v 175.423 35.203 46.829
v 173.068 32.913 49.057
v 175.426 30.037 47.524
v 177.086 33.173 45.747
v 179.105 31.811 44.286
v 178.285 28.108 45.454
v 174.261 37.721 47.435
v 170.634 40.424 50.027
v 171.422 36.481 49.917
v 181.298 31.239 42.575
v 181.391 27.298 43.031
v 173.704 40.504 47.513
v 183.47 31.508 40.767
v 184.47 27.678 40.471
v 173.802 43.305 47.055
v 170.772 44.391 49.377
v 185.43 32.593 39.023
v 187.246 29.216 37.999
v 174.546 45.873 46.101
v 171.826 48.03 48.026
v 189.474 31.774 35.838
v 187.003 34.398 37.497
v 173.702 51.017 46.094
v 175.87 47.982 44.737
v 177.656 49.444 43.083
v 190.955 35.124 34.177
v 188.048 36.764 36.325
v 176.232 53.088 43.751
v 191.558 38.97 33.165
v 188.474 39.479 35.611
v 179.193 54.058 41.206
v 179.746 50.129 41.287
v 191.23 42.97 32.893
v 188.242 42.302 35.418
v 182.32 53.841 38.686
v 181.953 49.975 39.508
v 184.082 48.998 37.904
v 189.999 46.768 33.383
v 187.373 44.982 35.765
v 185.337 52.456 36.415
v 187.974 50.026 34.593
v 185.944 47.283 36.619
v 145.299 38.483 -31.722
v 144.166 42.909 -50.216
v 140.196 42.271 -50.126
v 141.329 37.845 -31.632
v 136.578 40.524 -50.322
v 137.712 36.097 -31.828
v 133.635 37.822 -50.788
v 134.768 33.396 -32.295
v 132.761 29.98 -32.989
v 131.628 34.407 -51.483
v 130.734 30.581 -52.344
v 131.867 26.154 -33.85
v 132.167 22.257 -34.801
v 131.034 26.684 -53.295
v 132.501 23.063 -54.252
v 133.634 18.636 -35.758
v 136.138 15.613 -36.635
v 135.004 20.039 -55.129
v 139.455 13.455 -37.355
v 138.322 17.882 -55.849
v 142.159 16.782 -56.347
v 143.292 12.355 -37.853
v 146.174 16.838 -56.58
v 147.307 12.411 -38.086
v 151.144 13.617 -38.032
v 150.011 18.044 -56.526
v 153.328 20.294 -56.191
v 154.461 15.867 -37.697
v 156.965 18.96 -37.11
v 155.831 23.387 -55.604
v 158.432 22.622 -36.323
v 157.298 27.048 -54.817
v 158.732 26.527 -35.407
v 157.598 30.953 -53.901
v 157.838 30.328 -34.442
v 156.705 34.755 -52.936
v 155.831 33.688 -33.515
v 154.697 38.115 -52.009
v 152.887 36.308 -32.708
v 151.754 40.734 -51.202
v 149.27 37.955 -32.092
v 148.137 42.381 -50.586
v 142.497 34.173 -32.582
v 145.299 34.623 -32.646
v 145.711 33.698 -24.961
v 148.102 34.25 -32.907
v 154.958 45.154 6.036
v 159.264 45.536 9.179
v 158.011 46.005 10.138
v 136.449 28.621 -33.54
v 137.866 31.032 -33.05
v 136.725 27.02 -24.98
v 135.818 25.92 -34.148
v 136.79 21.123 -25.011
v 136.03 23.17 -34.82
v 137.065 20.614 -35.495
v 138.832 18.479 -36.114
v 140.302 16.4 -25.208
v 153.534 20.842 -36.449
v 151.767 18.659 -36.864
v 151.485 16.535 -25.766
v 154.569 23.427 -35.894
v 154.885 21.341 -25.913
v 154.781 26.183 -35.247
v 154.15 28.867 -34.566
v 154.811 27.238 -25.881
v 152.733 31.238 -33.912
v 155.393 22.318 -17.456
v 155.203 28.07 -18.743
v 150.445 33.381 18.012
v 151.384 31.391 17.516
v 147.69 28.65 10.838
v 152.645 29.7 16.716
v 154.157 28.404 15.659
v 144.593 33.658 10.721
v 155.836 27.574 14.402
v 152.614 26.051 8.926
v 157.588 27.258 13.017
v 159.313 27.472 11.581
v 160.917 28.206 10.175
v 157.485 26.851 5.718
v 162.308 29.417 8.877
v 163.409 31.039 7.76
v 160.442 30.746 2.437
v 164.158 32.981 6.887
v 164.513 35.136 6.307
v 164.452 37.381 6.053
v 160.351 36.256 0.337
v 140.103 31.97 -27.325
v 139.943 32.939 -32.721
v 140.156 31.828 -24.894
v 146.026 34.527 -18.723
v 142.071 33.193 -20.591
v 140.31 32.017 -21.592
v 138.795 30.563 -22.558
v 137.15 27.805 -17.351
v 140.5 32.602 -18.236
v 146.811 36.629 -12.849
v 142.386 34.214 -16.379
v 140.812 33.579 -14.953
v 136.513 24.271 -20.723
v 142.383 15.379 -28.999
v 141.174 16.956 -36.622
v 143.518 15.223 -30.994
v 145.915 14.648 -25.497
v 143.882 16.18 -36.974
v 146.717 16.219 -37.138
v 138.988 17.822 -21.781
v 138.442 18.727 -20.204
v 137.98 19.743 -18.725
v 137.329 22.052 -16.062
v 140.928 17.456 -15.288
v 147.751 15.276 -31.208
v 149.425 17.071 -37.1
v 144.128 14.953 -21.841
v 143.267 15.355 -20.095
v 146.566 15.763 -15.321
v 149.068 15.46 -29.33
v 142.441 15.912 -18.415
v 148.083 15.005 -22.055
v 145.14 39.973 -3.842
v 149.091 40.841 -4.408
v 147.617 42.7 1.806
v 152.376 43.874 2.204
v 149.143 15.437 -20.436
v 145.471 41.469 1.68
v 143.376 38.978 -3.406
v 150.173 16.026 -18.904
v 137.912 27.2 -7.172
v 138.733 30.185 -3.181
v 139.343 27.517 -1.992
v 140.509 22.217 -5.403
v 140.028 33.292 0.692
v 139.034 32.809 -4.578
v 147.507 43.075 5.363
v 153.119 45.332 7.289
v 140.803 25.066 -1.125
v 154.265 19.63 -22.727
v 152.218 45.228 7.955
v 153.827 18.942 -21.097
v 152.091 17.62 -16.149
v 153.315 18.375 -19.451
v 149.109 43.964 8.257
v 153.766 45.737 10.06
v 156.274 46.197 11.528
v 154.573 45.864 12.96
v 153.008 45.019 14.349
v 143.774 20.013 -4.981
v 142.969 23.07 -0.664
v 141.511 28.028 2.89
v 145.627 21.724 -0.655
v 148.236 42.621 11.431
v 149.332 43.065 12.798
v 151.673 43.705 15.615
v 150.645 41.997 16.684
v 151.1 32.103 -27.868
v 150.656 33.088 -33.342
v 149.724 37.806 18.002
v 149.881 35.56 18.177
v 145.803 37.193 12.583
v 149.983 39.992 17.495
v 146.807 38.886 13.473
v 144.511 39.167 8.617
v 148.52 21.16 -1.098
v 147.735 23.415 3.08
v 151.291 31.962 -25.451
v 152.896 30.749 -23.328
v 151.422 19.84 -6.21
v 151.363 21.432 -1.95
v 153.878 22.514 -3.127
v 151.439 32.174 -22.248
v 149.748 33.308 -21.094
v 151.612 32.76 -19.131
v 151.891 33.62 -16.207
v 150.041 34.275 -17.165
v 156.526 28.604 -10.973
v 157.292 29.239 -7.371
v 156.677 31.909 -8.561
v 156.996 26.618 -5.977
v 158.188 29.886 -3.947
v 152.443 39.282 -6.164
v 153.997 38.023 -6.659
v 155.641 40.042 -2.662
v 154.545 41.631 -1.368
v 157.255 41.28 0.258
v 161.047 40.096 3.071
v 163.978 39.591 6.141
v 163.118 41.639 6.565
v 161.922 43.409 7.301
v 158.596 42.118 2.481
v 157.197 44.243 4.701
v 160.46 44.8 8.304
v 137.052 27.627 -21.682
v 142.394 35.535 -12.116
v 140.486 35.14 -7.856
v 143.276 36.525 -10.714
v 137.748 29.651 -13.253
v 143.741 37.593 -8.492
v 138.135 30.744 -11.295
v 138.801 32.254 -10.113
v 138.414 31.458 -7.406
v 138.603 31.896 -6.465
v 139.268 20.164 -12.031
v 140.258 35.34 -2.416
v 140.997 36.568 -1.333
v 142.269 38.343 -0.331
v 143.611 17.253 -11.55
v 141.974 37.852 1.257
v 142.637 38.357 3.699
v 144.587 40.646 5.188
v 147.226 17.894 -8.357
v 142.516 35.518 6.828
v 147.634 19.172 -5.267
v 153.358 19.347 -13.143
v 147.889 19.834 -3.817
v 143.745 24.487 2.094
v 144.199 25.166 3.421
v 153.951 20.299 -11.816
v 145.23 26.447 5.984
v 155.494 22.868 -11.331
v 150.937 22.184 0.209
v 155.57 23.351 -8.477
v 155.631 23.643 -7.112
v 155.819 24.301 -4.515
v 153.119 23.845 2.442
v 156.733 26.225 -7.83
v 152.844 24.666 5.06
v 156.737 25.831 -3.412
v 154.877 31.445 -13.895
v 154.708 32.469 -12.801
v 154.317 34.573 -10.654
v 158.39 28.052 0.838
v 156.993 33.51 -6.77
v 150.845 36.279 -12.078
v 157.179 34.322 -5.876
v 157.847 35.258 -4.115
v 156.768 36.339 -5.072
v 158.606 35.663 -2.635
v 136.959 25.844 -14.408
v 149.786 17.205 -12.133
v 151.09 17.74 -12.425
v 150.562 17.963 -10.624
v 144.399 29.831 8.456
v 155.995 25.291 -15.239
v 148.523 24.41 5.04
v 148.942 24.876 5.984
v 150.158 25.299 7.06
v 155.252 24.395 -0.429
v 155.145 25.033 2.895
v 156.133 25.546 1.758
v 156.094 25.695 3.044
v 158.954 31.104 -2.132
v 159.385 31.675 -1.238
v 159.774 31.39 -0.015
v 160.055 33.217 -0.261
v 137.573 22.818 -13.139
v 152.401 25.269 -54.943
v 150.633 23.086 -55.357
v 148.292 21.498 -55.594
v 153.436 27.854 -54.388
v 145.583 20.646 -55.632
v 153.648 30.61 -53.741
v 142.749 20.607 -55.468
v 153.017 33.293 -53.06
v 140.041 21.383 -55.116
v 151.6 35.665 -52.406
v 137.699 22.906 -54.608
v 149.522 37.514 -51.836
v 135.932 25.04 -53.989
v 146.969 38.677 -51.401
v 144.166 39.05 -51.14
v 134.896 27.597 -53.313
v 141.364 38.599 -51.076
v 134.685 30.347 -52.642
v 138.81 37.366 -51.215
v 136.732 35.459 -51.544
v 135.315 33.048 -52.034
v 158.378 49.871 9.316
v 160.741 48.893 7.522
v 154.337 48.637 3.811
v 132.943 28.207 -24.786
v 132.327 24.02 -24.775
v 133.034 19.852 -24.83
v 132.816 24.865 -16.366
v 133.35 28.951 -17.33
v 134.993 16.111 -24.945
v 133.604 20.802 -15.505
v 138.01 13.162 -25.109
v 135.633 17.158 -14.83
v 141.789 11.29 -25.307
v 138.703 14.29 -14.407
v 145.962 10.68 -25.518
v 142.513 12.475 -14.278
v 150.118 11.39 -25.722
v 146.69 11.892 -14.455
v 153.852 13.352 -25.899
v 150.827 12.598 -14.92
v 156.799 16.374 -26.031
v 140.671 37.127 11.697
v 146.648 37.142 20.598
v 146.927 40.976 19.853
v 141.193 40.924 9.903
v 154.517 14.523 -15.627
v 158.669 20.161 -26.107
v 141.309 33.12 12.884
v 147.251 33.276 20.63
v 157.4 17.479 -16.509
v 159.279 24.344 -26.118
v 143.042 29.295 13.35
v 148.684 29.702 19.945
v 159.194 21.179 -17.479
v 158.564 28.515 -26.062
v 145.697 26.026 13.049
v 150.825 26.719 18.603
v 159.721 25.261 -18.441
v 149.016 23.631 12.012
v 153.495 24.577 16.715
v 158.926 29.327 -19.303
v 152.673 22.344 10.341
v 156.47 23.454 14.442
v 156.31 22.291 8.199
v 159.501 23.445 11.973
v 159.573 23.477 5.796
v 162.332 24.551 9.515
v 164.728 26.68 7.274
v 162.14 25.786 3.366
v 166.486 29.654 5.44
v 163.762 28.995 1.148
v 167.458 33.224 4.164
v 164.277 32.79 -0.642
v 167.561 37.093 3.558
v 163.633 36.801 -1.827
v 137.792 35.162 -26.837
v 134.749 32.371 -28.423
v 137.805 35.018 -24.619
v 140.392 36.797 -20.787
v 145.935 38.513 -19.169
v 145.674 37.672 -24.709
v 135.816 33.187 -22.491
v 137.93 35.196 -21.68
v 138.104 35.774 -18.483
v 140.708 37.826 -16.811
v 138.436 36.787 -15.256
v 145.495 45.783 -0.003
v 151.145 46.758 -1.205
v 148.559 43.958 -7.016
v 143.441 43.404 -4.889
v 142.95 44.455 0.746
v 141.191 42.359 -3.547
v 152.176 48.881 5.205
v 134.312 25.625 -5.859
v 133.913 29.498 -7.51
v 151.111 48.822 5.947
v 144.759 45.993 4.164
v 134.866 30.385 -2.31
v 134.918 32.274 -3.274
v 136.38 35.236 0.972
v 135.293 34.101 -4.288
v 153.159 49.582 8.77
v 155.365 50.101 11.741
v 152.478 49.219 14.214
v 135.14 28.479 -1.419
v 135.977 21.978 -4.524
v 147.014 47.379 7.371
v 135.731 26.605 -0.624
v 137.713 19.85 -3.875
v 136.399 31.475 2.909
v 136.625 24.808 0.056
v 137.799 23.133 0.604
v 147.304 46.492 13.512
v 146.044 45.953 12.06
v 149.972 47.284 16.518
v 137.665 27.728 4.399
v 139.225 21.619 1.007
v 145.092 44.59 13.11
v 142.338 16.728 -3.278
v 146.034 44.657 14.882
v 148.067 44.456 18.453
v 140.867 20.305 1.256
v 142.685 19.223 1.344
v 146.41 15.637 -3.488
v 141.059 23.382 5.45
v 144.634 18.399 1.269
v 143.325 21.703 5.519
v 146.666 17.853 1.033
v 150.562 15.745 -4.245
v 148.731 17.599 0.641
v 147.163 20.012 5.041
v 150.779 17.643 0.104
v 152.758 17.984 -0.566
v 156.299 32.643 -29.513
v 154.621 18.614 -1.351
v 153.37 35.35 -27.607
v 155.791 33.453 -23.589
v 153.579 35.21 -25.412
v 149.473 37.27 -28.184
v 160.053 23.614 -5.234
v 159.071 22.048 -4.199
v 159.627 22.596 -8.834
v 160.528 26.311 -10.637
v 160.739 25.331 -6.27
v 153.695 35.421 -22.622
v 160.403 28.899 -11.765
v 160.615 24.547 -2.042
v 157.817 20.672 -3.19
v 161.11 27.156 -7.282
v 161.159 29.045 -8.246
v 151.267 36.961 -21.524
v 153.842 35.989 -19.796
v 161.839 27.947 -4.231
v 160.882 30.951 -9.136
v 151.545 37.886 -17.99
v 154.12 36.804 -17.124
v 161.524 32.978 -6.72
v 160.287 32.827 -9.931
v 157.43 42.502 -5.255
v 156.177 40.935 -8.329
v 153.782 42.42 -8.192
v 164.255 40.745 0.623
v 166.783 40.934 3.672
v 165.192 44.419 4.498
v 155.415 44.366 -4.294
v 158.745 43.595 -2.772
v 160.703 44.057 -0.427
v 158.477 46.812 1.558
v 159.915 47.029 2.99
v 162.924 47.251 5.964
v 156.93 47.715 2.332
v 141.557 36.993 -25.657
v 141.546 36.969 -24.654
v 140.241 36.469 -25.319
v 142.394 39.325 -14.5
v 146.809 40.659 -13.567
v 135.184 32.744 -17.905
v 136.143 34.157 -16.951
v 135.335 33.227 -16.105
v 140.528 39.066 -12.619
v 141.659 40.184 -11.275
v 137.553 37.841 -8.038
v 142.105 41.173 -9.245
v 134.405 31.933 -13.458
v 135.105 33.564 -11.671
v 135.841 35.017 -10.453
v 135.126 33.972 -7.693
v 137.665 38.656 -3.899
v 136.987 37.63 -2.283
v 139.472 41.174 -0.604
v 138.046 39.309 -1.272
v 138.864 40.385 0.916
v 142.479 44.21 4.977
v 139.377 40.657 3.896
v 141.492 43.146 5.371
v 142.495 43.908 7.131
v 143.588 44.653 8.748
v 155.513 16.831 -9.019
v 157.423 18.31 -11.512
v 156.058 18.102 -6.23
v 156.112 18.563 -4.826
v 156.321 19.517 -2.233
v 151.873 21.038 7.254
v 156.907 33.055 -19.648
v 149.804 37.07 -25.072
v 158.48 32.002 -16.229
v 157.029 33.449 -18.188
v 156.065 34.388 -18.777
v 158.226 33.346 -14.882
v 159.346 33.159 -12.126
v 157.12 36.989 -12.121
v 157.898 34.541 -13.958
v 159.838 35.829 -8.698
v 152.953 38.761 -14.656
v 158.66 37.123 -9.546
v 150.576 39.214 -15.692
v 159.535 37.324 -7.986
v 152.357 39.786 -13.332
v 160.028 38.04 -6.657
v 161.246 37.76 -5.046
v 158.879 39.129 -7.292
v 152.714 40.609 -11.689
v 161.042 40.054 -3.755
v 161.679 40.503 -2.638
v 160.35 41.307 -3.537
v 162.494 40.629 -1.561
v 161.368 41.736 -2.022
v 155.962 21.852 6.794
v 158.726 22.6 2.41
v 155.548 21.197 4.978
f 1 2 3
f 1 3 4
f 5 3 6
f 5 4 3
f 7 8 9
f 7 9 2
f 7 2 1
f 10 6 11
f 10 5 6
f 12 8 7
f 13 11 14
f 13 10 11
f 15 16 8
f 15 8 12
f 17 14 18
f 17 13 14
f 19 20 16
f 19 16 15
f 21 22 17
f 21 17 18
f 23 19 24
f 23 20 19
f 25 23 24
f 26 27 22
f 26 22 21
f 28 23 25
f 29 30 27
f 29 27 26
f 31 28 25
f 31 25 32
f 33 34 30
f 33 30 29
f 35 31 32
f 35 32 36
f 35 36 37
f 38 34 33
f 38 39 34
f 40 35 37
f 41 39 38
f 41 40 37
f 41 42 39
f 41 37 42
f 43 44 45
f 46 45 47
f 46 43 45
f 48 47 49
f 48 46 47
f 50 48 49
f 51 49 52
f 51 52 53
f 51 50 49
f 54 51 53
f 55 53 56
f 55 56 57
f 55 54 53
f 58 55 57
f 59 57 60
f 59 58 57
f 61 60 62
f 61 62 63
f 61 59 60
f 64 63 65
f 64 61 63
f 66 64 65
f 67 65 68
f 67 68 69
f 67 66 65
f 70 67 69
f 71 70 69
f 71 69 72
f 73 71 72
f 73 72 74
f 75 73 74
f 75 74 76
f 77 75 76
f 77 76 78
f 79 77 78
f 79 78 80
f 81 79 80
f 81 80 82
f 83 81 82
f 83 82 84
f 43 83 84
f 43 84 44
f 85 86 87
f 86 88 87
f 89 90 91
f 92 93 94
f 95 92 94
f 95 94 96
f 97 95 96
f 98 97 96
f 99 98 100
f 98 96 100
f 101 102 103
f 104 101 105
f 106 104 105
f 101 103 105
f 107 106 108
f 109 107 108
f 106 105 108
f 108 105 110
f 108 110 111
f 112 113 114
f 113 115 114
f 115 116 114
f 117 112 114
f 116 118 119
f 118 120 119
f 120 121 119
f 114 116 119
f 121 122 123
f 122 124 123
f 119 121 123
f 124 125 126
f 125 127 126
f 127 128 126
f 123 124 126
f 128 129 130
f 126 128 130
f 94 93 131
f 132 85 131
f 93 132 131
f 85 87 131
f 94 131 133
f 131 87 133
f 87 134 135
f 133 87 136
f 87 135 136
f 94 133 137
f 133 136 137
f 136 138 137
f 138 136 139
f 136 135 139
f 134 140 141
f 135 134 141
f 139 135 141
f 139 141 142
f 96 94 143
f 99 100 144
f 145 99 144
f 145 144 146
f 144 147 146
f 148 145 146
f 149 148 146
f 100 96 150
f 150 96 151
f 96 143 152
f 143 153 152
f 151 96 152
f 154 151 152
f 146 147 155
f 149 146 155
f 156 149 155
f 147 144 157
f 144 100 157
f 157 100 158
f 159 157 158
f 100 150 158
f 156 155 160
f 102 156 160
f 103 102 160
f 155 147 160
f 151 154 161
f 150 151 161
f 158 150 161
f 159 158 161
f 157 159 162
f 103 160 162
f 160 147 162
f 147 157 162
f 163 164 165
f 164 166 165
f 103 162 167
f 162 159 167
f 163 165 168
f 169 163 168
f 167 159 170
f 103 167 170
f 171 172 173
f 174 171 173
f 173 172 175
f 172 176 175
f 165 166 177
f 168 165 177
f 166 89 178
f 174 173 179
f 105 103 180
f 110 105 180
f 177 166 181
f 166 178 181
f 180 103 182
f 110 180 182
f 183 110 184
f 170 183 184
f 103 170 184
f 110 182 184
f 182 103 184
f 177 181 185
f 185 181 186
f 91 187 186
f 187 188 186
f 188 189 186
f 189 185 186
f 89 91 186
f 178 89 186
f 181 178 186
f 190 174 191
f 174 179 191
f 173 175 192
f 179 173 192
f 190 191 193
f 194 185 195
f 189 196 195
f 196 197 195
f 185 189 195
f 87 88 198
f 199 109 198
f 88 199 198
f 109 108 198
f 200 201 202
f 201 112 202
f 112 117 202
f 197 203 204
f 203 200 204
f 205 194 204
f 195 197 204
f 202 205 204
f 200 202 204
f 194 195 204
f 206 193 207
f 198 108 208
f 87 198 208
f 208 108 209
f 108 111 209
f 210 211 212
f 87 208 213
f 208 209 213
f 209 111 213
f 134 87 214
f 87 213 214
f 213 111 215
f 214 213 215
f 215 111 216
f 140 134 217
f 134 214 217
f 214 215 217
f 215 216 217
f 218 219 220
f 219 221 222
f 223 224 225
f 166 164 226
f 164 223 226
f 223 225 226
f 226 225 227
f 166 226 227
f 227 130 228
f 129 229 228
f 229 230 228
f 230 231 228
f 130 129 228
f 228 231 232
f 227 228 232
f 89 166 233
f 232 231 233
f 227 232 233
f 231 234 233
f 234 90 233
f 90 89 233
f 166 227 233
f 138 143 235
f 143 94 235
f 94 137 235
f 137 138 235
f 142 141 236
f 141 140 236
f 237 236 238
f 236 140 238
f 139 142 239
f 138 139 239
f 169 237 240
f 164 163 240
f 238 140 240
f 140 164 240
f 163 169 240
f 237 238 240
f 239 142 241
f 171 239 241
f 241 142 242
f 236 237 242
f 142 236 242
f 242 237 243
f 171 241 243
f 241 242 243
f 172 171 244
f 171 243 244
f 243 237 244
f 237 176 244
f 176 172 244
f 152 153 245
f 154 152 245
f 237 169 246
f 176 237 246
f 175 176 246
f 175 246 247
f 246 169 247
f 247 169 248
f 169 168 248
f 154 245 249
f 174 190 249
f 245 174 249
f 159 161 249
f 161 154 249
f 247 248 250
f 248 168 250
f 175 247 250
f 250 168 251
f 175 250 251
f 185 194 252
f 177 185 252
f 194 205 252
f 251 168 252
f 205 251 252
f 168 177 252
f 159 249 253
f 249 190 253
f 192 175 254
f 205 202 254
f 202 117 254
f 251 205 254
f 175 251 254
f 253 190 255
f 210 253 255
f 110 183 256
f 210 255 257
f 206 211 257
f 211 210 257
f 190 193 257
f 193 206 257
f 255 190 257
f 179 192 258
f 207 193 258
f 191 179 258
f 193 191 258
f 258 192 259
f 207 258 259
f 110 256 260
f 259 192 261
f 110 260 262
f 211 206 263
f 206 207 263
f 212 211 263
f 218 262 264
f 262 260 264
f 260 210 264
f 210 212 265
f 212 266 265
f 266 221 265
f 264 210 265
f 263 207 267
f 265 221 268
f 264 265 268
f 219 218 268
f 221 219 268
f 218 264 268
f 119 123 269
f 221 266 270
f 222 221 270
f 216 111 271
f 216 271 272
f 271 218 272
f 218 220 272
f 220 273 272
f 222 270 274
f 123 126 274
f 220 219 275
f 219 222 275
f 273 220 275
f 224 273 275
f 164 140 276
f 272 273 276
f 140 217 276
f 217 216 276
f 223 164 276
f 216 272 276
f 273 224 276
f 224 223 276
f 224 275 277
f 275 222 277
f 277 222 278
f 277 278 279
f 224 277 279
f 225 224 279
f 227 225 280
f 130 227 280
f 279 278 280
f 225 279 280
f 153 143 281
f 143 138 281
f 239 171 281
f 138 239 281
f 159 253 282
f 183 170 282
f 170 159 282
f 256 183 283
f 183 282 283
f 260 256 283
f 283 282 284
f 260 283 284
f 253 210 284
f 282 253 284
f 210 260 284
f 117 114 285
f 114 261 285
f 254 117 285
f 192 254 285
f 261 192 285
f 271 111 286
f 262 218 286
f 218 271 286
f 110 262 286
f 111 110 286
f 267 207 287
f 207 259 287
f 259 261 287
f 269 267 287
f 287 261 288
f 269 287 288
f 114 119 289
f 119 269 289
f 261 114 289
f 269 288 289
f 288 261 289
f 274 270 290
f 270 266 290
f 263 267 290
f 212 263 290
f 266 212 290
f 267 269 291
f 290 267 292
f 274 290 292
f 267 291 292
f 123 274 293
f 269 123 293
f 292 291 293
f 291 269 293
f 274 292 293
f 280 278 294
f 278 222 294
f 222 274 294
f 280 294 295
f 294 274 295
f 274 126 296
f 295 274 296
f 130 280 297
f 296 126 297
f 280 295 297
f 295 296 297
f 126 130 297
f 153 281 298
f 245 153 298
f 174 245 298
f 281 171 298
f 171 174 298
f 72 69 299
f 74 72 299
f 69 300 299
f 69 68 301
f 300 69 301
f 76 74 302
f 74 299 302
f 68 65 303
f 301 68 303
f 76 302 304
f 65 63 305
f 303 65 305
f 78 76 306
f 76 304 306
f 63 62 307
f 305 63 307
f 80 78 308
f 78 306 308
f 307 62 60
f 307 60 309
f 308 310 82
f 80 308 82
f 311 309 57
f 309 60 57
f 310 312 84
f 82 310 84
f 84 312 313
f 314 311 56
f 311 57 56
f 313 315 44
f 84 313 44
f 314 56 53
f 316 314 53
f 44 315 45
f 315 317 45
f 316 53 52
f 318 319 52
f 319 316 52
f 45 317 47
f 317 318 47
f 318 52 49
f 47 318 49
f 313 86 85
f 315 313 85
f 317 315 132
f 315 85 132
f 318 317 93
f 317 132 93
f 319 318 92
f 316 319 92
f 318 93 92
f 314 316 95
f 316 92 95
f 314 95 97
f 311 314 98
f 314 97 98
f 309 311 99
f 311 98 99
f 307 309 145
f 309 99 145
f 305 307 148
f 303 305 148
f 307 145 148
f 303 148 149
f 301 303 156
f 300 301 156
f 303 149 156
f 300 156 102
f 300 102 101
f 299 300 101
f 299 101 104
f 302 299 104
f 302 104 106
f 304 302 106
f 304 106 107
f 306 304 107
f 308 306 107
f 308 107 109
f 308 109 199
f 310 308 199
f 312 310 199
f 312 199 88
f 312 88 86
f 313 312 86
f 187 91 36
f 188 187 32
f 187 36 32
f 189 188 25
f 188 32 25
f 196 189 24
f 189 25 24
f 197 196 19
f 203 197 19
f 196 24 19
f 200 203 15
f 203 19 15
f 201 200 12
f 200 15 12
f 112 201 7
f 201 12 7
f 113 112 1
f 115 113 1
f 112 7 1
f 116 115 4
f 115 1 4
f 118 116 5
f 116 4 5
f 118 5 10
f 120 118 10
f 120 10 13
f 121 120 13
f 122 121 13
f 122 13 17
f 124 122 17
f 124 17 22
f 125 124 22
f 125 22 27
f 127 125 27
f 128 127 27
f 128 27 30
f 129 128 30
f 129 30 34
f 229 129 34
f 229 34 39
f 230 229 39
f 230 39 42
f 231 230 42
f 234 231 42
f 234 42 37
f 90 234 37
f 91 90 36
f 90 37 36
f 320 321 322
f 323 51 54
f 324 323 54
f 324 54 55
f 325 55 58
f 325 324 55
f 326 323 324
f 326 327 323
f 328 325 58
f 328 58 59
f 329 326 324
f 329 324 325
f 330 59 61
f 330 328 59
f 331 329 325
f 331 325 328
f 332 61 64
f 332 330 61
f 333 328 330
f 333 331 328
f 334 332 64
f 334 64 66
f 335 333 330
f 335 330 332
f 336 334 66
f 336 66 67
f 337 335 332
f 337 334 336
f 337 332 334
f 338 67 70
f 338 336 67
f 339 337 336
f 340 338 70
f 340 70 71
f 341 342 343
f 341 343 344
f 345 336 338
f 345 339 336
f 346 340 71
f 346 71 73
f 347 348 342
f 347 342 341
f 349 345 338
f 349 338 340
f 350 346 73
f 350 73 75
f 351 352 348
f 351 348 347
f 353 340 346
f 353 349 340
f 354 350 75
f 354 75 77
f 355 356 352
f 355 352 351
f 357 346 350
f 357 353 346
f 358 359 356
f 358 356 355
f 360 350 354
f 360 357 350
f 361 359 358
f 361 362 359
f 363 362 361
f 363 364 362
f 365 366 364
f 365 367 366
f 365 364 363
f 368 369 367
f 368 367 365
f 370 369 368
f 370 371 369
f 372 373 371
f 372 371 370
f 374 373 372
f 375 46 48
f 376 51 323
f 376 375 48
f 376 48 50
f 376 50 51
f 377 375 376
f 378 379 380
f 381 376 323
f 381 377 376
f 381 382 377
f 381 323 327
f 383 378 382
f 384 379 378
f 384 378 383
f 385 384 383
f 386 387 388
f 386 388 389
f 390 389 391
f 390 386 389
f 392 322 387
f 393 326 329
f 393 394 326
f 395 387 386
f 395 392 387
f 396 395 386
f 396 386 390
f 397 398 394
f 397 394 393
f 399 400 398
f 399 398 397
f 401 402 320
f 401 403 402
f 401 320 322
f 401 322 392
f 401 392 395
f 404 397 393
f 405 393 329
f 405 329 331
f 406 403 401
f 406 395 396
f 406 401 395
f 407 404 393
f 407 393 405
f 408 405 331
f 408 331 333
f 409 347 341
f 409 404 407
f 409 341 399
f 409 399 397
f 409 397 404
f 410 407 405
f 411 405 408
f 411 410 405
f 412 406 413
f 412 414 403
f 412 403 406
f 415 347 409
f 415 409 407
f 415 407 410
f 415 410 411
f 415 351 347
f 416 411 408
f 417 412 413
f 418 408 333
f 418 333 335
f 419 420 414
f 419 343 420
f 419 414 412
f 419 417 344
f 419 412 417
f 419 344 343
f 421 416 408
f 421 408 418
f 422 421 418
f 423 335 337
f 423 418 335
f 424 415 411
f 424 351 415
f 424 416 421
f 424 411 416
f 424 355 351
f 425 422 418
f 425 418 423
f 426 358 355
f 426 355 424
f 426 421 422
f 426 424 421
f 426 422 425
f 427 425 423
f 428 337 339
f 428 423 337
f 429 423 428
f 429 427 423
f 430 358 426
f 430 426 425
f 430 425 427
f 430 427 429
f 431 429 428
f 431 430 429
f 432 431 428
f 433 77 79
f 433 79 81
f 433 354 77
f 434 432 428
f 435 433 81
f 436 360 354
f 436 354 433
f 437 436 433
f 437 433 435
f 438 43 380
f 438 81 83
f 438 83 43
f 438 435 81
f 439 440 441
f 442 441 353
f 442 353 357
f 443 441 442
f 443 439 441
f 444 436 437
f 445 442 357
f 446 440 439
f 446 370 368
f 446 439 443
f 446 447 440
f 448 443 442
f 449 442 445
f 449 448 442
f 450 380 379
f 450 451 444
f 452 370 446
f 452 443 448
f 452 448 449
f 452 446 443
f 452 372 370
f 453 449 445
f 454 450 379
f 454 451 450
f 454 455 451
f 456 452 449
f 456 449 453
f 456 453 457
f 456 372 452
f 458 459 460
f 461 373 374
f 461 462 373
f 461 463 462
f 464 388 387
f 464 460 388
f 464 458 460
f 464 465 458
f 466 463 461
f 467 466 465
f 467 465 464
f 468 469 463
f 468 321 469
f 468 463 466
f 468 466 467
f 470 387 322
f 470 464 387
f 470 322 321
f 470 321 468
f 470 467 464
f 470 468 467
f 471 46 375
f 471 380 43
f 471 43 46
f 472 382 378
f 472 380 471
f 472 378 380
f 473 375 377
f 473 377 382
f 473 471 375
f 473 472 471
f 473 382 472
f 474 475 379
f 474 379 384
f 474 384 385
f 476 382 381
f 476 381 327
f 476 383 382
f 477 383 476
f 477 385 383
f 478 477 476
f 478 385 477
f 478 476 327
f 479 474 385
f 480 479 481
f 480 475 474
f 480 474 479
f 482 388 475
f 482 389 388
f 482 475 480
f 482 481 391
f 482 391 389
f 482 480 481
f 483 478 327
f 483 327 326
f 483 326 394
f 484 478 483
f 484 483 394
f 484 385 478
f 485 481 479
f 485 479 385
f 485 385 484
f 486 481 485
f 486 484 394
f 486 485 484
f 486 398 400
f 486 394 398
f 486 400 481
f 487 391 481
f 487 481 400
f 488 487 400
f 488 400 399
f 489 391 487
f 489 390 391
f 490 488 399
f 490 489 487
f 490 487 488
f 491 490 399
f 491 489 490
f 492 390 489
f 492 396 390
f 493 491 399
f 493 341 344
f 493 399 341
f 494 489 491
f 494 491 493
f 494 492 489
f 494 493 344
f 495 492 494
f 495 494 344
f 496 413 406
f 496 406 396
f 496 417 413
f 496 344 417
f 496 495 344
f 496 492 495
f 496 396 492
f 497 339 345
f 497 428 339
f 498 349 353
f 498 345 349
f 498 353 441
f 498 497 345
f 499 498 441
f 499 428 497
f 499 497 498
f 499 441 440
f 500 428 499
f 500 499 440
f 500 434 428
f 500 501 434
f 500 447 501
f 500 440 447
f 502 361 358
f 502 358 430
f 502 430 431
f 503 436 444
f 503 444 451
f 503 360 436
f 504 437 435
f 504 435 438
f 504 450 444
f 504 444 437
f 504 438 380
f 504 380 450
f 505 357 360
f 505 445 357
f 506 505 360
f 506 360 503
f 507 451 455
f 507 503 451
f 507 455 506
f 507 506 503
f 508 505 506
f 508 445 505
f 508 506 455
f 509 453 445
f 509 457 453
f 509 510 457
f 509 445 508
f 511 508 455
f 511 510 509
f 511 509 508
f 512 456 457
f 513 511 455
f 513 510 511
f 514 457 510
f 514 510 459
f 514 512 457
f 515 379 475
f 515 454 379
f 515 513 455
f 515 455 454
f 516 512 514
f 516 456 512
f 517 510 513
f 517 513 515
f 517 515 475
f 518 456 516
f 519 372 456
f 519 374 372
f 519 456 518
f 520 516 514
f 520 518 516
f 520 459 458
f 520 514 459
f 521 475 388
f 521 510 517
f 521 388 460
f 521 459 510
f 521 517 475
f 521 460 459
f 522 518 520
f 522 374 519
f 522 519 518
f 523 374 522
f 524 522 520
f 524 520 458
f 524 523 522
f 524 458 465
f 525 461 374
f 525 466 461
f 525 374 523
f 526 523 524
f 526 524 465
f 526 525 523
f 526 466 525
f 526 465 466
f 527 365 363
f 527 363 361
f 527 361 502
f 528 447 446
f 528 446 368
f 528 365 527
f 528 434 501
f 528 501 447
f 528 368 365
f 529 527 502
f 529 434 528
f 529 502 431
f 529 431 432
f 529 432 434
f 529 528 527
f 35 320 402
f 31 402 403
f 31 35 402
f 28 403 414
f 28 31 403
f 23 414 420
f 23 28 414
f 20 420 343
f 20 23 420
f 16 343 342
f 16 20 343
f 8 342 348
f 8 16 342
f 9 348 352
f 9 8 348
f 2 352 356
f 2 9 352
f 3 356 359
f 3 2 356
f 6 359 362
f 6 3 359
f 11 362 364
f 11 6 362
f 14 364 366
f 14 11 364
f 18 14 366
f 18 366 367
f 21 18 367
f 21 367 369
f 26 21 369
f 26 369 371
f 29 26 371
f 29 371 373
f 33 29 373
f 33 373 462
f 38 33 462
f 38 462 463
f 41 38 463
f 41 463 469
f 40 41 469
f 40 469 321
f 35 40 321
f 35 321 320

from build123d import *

# Parameters (mm, degrees)
SWEEP1_PROFILE_R     = 13.49375
CUT_SWEEP1_PROFILE_R = 9.525


with BuildPart() as part:
    # Sweep1: sweep along a curve in space
    with BuildLine() as sweep1_path:
        Line((144.16623583, 29.78638886, -53.357198813), (145.299475263, 25.359683675, -34.863347144))
        add(Edge.make_bspline(
            [(145.299475263, 25.359683675, -34.863347144), (146.690863379, 19.924587782, -12.156649263), (145.49252871, 34.79865885, -2.165117432), (157.129656366, 36.72827895, 12.110093025)],
            knots=[0, 0, 0, 0, 1, 1, 1, 1], degree=3))
        Line((157.129656366, 36.72827895, 12.110093025), (181.072152323, 40.698324032, 41.480241636))
    # Sweep1 profile (on start of the path) → Sweep1 (sweep)
    with BuildSketch(Plane(origin=(144.16623583, 29.78638886, -53.357198813), x_dir=(0, 0.9725281679518014, 0.23278522835505014), z_dir=(0.059487634281804834, -0.23237297561799386, 0.9708058619363572))):
        Circle(SWEEP1_PROFILE_R)
    sweep(path=sweep1_path.line)

    # Cut-Sweep1: sweep along a curve in space
    with BuildLine() as cut_sweep1_path:
        Line((144.16623583, 29.78638886, -53.357198813), (145.299475263, 25.359683675, -34.863347144))
        add(Edge.make_bspline(
            [(145.299475263, 25.359683675, -34.863347144), (146.690863379, 19.924587782, -12.156649263), (145.49252871, 34.79865885, -2.165117432), (157.129656366, 36.72827895, 12.110093025)],
            knots=[0, 0, 0, 0, 1, 1, 1, 1], degree=3))
        Line((157.129656366, 36.72827895, 12.110093025), (181.072152323, 40.698324032, 41.480241636))
    # Cut-Sweep1 profile (on start of the path) → Cut-Sweep1 (sweep, cut)
    with BuildSketch(Plane(origin=(144.16623583, 29.78638886, -53.357198813), x_dir=(0, 0.9725281679518014, 0.23278522835505014), z_dir=(0.059487634281804834, -0.23237297561799386, 0.9708058619363572))):
        Circle(CUT_SWEEP1_PROFILE_R)
    sweep(path=cut_sweep1_path.line, mode=Mode.SUBTRACT)


solid = part.part
